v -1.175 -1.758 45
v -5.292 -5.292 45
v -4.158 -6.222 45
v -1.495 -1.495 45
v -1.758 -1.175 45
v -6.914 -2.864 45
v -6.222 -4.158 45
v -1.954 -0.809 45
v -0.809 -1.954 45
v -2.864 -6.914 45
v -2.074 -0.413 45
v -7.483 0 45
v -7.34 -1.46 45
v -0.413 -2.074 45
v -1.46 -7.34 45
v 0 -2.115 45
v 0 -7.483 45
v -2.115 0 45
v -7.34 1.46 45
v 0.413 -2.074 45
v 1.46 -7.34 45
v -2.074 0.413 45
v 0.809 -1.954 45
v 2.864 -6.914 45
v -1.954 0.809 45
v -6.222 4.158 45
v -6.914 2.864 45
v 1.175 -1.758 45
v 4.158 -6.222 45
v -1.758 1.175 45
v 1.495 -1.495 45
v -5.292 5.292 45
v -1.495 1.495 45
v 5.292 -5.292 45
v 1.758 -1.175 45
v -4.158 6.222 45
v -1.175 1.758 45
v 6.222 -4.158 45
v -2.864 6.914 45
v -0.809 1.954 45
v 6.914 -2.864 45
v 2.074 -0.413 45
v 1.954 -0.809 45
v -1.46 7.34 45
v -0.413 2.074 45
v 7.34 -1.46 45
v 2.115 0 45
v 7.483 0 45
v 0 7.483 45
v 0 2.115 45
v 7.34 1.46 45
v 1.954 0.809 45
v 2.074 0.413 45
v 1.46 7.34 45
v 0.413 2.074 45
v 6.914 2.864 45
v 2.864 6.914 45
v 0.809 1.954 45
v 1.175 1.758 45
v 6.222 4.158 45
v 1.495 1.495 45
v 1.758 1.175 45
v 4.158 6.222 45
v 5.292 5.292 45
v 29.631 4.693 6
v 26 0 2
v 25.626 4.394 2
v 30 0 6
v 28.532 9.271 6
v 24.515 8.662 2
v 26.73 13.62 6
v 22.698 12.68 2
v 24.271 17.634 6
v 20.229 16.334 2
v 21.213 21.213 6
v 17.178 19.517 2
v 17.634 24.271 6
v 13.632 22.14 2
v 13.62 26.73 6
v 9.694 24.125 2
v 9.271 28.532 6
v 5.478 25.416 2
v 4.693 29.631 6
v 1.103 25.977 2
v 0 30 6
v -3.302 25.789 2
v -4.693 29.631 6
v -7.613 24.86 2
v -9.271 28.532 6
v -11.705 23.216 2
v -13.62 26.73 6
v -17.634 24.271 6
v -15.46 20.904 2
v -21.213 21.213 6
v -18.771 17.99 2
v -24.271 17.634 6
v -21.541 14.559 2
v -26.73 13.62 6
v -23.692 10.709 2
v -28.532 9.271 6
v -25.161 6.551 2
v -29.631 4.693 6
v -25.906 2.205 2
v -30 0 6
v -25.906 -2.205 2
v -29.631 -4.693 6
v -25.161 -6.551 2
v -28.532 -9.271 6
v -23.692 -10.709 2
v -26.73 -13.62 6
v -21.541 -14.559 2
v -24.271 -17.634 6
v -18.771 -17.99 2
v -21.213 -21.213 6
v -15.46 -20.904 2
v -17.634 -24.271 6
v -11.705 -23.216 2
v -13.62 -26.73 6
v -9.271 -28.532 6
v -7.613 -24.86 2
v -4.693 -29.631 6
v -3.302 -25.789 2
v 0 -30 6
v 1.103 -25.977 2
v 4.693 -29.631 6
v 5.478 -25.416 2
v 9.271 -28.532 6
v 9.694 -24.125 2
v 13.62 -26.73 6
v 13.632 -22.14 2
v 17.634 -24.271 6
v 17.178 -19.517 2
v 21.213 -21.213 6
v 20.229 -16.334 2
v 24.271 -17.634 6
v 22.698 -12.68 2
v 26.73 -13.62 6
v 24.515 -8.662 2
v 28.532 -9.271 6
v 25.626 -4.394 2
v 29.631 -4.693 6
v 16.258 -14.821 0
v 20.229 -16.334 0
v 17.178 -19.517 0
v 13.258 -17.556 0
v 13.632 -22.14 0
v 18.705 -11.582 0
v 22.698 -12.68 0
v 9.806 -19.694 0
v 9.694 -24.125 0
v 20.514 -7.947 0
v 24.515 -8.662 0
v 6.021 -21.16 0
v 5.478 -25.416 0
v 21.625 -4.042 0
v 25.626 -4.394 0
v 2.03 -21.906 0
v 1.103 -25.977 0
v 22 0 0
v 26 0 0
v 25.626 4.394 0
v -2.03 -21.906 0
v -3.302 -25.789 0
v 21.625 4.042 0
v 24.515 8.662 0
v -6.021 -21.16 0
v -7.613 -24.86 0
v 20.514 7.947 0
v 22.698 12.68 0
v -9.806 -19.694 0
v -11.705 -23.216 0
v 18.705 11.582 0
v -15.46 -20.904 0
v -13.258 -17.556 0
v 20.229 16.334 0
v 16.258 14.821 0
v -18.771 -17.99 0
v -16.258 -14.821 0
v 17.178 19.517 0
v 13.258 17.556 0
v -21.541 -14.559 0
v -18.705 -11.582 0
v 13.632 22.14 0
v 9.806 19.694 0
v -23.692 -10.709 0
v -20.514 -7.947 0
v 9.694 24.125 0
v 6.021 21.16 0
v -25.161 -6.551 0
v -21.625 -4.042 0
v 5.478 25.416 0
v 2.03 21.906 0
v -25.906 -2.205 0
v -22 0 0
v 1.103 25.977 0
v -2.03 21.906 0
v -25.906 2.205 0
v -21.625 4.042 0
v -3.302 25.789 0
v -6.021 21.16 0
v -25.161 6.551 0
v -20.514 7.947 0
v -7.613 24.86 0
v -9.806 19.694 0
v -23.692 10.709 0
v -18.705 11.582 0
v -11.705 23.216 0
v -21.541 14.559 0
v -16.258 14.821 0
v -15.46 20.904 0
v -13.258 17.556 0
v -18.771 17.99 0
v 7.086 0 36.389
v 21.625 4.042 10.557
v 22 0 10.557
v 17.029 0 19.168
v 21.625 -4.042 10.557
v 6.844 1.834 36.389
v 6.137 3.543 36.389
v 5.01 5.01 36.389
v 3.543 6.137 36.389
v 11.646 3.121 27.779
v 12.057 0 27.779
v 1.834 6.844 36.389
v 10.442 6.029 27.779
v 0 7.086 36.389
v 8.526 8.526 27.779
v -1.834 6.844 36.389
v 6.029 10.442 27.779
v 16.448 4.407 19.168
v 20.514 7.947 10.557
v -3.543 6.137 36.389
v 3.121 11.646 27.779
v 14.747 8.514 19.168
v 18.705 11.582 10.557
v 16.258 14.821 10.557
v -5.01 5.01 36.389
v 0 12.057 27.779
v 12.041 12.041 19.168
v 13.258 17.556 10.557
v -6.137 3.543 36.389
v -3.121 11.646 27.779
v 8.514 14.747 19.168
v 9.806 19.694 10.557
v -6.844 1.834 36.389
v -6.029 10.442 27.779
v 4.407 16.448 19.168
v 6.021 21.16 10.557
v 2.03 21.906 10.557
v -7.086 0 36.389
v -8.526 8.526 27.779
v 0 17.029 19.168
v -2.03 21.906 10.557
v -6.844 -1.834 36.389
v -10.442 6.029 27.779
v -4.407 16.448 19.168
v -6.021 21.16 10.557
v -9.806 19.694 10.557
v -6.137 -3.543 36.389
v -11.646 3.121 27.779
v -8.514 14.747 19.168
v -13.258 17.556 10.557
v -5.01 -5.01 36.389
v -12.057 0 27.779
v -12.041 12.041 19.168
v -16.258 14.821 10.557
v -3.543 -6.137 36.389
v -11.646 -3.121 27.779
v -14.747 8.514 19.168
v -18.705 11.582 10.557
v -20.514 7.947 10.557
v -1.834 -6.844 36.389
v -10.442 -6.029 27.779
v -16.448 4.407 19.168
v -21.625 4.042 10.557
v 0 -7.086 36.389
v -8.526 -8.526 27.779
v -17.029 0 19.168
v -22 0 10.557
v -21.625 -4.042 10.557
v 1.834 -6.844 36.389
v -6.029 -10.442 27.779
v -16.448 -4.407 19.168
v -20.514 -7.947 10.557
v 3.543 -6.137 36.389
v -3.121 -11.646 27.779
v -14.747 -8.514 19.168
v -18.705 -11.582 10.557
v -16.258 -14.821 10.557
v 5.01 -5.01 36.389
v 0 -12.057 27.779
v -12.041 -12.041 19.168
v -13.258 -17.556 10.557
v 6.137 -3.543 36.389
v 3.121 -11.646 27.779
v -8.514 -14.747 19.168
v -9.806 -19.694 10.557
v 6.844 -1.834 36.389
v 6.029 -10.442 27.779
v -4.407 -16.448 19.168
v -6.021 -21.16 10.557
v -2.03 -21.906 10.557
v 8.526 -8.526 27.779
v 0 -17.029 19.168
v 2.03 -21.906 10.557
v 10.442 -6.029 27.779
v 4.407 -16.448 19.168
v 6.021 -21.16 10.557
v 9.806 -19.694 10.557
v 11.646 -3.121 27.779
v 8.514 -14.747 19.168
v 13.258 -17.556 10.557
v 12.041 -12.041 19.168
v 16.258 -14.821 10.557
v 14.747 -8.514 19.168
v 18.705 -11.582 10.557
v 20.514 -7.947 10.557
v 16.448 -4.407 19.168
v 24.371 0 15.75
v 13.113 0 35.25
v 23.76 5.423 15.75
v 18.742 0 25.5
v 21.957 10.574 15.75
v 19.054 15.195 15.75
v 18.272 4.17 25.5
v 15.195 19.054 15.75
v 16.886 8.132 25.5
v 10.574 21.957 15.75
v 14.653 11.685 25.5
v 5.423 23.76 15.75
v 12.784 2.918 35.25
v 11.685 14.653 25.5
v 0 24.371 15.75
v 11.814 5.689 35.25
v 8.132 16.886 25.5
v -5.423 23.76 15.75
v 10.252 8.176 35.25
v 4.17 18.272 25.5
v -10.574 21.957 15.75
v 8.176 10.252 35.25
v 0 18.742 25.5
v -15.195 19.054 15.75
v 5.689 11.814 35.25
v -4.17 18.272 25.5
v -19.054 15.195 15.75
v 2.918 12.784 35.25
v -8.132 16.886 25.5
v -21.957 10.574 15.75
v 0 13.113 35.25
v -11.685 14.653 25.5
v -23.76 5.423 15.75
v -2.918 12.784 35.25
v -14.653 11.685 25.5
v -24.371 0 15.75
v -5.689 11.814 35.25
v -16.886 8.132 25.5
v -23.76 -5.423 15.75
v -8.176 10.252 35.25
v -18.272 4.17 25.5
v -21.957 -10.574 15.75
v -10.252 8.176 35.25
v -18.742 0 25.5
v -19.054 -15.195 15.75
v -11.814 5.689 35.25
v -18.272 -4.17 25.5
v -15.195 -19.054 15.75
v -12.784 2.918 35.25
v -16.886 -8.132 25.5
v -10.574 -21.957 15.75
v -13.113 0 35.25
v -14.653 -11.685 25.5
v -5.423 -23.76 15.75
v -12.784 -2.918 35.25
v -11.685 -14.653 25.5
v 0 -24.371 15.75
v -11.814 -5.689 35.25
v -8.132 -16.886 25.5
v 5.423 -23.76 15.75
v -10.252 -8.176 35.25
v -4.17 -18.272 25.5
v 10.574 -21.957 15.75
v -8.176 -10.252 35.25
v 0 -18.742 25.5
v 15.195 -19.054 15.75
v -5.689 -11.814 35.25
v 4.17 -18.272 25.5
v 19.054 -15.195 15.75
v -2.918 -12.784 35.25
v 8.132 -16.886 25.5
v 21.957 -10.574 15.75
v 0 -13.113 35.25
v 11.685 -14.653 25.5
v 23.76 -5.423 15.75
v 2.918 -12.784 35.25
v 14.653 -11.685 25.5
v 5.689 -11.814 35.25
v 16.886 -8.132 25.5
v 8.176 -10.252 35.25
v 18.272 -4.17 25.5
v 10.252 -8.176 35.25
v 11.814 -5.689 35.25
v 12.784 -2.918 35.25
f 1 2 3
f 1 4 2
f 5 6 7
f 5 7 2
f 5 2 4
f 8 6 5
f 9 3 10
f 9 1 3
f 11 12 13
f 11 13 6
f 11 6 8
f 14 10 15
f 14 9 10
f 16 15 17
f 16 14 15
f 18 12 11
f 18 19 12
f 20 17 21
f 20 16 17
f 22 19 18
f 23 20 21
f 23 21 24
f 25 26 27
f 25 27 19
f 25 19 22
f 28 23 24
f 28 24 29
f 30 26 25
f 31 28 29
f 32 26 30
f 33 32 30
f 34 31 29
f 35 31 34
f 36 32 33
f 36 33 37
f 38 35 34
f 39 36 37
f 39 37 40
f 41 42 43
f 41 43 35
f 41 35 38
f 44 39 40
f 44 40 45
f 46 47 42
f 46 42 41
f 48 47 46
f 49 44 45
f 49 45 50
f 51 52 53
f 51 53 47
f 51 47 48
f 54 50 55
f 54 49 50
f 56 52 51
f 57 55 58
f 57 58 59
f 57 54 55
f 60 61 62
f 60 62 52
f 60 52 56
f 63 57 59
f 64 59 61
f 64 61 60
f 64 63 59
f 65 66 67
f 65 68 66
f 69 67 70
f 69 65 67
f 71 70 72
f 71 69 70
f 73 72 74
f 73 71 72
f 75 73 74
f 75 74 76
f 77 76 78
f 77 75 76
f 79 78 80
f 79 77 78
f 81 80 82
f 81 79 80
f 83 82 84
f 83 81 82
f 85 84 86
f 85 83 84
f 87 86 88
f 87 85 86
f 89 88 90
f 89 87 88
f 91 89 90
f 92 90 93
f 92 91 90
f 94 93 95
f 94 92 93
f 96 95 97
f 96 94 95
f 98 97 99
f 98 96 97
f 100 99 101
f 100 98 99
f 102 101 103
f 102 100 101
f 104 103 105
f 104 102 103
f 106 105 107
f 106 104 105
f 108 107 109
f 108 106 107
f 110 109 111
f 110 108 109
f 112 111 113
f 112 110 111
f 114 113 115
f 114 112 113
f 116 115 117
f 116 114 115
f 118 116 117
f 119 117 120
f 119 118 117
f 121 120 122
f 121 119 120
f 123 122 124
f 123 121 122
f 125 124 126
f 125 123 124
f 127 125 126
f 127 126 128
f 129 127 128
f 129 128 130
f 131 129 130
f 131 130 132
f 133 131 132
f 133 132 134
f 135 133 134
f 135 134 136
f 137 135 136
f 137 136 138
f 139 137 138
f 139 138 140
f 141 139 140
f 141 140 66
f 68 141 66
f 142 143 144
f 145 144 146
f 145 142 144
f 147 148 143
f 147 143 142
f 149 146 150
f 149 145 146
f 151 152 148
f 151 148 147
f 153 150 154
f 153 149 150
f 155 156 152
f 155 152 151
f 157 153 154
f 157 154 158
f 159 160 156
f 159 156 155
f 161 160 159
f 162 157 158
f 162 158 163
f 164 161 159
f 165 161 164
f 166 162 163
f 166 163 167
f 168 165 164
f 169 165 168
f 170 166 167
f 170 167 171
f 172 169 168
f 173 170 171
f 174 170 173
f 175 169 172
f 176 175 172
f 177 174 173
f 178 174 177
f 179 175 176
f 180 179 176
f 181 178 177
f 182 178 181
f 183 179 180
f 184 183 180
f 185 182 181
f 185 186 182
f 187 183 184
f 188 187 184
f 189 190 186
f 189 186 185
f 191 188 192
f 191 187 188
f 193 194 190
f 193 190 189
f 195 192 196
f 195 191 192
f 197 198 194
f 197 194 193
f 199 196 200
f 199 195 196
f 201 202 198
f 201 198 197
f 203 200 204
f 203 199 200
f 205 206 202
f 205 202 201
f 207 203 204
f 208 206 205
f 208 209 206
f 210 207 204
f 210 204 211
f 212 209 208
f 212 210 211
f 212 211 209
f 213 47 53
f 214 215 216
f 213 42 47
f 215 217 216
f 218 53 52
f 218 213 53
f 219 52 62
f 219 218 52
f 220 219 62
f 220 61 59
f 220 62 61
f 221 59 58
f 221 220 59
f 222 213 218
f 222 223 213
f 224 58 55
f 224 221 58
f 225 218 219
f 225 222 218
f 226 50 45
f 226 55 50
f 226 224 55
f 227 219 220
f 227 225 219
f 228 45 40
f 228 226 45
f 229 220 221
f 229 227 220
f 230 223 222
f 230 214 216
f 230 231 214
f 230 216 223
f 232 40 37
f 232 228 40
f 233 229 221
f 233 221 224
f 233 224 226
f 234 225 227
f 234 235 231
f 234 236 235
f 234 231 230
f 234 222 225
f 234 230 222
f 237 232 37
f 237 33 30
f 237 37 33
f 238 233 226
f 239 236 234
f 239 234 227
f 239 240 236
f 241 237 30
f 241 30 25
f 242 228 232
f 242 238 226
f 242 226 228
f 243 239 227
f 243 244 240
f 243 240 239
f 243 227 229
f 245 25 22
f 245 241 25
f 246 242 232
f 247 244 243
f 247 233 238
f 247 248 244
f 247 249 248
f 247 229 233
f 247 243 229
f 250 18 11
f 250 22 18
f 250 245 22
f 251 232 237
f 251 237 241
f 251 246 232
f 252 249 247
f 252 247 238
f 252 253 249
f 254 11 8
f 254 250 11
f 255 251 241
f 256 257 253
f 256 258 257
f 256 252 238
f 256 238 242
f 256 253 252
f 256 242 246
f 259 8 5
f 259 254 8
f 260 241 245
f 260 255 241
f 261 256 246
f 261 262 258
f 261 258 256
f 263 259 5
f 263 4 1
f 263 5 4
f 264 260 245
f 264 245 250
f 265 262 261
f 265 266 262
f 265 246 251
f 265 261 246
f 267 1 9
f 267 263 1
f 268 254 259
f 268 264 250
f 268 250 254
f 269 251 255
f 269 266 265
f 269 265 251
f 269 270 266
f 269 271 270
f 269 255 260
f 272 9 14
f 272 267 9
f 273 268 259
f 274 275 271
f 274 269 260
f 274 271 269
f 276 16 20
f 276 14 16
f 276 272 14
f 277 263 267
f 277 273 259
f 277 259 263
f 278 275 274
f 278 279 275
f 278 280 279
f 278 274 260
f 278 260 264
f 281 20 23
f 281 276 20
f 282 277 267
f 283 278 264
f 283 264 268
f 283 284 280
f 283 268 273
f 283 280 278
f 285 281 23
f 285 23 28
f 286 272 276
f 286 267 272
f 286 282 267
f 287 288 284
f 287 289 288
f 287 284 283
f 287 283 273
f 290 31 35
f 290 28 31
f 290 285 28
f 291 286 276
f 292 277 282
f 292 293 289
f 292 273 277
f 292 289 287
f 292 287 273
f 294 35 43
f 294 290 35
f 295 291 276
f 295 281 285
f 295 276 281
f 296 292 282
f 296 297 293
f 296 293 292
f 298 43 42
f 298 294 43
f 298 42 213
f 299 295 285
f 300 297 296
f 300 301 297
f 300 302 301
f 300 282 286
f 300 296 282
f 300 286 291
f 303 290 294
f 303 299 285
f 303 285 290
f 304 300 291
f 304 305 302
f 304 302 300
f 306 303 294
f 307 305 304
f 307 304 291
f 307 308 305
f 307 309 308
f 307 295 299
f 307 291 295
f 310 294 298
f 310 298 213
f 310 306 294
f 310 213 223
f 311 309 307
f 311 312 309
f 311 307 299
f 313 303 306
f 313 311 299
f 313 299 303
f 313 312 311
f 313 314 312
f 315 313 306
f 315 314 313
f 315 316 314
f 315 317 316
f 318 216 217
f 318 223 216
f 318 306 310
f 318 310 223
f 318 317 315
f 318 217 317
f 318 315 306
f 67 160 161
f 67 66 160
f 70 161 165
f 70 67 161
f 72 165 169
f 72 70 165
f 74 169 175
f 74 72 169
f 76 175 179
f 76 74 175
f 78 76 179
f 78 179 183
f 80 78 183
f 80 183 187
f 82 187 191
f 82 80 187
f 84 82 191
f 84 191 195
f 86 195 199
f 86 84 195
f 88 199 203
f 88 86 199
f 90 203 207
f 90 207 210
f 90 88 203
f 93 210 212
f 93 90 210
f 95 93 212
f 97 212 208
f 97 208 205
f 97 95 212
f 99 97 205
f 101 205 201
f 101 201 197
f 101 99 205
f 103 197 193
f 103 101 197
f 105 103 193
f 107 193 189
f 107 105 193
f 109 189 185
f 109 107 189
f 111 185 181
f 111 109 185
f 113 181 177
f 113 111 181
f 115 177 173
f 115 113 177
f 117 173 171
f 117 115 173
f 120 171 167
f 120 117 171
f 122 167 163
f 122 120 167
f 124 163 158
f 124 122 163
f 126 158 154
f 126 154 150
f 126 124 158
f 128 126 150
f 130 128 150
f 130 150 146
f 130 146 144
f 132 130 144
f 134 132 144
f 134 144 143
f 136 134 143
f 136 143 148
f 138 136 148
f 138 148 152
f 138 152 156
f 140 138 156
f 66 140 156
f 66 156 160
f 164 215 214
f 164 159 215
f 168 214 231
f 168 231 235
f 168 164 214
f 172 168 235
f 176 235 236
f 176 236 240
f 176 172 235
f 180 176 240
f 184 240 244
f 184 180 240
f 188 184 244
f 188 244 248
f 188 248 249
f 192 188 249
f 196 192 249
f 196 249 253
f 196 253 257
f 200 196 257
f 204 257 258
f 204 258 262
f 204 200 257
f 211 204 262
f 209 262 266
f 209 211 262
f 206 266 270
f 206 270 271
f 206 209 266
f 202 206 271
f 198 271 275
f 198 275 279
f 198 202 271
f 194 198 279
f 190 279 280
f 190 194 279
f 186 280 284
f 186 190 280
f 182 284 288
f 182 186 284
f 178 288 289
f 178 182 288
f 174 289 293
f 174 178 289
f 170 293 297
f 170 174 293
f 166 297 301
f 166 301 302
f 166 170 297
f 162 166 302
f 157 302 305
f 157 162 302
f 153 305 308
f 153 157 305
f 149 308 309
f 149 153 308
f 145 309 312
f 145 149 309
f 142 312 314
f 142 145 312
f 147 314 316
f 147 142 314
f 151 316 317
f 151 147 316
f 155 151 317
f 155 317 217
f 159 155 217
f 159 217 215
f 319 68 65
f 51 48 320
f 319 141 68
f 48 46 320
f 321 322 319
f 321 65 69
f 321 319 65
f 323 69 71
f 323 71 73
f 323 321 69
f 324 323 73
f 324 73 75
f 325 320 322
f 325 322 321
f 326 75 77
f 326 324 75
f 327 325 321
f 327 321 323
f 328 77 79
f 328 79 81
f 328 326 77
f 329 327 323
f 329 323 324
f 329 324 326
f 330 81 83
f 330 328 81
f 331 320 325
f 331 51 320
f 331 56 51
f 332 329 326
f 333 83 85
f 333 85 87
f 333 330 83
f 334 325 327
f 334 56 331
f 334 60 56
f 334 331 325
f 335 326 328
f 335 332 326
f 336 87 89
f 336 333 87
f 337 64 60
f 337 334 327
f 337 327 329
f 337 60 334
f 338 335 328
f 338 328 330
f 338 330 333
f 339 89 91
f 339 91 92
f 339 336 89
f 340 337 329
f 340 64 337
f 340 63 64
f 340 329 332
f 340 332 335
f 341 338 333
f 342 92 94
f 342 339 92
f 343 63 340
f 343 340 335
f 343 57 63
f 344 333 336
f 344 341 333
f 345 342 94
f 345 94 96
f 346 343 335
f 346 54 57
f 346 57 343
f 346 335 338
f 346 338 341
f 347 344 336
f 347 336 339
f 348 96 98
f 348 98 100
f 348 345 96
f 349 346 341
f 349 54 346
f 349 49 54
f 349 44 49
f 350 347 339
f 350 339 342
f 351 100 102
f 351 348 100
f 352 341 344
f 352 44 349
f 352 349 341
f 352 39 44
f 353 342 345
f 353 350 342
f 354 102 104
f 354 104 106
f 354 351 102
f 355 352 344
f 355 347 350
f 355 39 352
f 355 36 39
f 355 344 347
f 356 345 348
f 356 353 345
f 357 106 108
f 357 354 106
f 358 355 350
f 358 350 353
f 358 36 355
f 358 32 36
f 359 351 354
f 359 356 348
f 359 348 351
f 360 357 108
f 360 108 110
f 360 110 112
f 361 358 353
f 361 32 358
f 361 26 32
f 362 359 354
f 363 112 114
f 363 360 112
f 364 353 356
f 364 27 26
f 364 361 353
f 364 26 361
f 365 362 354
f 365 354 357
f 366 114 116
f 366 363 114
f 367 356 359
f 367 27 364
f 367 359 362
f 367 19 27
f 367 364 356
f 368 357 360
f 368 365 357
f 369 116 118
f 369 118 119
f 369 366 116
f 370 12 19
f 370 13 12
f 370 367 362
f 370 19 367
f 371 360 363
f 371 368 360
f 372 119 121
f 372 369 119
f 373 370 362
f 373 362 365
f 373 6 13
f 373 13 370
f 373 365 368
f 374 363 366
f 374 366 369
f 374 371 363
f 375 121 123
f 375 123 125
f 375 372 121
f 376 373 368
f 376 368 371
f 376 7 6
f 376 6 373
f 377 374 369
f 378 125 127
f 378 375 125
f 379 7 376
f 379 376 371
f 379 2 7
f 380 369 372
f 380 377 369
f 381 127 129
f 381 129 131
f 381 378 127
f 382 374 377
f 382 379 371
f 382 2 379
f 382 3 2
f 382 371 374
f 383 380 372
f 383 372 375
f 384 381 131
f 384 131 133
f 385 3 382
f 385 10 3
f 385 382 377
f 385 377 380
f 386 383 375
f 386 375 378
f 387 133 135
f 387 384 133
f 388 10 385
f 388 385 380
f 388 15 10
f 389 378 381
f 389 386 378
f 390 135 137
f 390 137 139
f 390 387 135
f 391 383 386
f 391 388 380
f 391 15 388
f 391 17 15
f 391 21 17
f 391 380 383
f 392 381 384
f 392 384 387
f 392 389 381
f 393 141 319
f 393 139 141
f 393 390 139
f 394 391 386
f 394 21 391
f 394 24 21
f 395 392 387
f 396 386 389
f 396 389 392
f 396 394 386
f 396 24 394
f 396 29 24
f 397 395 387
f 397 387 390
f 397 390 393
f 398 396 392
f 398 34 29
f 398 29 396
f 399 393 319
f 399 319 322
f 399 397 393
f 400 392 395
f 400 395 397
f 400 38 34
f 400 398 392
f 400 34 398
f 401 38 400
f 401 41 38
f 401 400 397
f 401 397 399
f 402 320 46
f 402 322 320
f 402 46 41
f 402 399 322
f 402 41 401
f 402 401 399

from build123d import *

# Parameters (mm, degrees)
SKETCH001_R  = 15.261185
POCKET_DEPTH = 14


with BuildPart() as part:
    # Sketch (on DatumPlane) → Revolution (revolve)
    with BuildSketch(Plane.XZ):
        Polygon((30, 6), (0.75, 56.662486), (0, 56.662486), (0, 48.662486), (22, 10.557368), (22, 0), (26, 0), (26, 2), align=None)
    revolve(axis=Axis((0, 0, 0), (0, 0, 1)))

    # Sketch001 (on DatumPlane) → Pocket (cut)
    with BuildSketch(Plane.XY.offset(45)):
        Circle(SKETCH001_R)
    extrude(amount=POCKET_DEPTH, mode=Mode.SUBTRACT)


solid = part.part
